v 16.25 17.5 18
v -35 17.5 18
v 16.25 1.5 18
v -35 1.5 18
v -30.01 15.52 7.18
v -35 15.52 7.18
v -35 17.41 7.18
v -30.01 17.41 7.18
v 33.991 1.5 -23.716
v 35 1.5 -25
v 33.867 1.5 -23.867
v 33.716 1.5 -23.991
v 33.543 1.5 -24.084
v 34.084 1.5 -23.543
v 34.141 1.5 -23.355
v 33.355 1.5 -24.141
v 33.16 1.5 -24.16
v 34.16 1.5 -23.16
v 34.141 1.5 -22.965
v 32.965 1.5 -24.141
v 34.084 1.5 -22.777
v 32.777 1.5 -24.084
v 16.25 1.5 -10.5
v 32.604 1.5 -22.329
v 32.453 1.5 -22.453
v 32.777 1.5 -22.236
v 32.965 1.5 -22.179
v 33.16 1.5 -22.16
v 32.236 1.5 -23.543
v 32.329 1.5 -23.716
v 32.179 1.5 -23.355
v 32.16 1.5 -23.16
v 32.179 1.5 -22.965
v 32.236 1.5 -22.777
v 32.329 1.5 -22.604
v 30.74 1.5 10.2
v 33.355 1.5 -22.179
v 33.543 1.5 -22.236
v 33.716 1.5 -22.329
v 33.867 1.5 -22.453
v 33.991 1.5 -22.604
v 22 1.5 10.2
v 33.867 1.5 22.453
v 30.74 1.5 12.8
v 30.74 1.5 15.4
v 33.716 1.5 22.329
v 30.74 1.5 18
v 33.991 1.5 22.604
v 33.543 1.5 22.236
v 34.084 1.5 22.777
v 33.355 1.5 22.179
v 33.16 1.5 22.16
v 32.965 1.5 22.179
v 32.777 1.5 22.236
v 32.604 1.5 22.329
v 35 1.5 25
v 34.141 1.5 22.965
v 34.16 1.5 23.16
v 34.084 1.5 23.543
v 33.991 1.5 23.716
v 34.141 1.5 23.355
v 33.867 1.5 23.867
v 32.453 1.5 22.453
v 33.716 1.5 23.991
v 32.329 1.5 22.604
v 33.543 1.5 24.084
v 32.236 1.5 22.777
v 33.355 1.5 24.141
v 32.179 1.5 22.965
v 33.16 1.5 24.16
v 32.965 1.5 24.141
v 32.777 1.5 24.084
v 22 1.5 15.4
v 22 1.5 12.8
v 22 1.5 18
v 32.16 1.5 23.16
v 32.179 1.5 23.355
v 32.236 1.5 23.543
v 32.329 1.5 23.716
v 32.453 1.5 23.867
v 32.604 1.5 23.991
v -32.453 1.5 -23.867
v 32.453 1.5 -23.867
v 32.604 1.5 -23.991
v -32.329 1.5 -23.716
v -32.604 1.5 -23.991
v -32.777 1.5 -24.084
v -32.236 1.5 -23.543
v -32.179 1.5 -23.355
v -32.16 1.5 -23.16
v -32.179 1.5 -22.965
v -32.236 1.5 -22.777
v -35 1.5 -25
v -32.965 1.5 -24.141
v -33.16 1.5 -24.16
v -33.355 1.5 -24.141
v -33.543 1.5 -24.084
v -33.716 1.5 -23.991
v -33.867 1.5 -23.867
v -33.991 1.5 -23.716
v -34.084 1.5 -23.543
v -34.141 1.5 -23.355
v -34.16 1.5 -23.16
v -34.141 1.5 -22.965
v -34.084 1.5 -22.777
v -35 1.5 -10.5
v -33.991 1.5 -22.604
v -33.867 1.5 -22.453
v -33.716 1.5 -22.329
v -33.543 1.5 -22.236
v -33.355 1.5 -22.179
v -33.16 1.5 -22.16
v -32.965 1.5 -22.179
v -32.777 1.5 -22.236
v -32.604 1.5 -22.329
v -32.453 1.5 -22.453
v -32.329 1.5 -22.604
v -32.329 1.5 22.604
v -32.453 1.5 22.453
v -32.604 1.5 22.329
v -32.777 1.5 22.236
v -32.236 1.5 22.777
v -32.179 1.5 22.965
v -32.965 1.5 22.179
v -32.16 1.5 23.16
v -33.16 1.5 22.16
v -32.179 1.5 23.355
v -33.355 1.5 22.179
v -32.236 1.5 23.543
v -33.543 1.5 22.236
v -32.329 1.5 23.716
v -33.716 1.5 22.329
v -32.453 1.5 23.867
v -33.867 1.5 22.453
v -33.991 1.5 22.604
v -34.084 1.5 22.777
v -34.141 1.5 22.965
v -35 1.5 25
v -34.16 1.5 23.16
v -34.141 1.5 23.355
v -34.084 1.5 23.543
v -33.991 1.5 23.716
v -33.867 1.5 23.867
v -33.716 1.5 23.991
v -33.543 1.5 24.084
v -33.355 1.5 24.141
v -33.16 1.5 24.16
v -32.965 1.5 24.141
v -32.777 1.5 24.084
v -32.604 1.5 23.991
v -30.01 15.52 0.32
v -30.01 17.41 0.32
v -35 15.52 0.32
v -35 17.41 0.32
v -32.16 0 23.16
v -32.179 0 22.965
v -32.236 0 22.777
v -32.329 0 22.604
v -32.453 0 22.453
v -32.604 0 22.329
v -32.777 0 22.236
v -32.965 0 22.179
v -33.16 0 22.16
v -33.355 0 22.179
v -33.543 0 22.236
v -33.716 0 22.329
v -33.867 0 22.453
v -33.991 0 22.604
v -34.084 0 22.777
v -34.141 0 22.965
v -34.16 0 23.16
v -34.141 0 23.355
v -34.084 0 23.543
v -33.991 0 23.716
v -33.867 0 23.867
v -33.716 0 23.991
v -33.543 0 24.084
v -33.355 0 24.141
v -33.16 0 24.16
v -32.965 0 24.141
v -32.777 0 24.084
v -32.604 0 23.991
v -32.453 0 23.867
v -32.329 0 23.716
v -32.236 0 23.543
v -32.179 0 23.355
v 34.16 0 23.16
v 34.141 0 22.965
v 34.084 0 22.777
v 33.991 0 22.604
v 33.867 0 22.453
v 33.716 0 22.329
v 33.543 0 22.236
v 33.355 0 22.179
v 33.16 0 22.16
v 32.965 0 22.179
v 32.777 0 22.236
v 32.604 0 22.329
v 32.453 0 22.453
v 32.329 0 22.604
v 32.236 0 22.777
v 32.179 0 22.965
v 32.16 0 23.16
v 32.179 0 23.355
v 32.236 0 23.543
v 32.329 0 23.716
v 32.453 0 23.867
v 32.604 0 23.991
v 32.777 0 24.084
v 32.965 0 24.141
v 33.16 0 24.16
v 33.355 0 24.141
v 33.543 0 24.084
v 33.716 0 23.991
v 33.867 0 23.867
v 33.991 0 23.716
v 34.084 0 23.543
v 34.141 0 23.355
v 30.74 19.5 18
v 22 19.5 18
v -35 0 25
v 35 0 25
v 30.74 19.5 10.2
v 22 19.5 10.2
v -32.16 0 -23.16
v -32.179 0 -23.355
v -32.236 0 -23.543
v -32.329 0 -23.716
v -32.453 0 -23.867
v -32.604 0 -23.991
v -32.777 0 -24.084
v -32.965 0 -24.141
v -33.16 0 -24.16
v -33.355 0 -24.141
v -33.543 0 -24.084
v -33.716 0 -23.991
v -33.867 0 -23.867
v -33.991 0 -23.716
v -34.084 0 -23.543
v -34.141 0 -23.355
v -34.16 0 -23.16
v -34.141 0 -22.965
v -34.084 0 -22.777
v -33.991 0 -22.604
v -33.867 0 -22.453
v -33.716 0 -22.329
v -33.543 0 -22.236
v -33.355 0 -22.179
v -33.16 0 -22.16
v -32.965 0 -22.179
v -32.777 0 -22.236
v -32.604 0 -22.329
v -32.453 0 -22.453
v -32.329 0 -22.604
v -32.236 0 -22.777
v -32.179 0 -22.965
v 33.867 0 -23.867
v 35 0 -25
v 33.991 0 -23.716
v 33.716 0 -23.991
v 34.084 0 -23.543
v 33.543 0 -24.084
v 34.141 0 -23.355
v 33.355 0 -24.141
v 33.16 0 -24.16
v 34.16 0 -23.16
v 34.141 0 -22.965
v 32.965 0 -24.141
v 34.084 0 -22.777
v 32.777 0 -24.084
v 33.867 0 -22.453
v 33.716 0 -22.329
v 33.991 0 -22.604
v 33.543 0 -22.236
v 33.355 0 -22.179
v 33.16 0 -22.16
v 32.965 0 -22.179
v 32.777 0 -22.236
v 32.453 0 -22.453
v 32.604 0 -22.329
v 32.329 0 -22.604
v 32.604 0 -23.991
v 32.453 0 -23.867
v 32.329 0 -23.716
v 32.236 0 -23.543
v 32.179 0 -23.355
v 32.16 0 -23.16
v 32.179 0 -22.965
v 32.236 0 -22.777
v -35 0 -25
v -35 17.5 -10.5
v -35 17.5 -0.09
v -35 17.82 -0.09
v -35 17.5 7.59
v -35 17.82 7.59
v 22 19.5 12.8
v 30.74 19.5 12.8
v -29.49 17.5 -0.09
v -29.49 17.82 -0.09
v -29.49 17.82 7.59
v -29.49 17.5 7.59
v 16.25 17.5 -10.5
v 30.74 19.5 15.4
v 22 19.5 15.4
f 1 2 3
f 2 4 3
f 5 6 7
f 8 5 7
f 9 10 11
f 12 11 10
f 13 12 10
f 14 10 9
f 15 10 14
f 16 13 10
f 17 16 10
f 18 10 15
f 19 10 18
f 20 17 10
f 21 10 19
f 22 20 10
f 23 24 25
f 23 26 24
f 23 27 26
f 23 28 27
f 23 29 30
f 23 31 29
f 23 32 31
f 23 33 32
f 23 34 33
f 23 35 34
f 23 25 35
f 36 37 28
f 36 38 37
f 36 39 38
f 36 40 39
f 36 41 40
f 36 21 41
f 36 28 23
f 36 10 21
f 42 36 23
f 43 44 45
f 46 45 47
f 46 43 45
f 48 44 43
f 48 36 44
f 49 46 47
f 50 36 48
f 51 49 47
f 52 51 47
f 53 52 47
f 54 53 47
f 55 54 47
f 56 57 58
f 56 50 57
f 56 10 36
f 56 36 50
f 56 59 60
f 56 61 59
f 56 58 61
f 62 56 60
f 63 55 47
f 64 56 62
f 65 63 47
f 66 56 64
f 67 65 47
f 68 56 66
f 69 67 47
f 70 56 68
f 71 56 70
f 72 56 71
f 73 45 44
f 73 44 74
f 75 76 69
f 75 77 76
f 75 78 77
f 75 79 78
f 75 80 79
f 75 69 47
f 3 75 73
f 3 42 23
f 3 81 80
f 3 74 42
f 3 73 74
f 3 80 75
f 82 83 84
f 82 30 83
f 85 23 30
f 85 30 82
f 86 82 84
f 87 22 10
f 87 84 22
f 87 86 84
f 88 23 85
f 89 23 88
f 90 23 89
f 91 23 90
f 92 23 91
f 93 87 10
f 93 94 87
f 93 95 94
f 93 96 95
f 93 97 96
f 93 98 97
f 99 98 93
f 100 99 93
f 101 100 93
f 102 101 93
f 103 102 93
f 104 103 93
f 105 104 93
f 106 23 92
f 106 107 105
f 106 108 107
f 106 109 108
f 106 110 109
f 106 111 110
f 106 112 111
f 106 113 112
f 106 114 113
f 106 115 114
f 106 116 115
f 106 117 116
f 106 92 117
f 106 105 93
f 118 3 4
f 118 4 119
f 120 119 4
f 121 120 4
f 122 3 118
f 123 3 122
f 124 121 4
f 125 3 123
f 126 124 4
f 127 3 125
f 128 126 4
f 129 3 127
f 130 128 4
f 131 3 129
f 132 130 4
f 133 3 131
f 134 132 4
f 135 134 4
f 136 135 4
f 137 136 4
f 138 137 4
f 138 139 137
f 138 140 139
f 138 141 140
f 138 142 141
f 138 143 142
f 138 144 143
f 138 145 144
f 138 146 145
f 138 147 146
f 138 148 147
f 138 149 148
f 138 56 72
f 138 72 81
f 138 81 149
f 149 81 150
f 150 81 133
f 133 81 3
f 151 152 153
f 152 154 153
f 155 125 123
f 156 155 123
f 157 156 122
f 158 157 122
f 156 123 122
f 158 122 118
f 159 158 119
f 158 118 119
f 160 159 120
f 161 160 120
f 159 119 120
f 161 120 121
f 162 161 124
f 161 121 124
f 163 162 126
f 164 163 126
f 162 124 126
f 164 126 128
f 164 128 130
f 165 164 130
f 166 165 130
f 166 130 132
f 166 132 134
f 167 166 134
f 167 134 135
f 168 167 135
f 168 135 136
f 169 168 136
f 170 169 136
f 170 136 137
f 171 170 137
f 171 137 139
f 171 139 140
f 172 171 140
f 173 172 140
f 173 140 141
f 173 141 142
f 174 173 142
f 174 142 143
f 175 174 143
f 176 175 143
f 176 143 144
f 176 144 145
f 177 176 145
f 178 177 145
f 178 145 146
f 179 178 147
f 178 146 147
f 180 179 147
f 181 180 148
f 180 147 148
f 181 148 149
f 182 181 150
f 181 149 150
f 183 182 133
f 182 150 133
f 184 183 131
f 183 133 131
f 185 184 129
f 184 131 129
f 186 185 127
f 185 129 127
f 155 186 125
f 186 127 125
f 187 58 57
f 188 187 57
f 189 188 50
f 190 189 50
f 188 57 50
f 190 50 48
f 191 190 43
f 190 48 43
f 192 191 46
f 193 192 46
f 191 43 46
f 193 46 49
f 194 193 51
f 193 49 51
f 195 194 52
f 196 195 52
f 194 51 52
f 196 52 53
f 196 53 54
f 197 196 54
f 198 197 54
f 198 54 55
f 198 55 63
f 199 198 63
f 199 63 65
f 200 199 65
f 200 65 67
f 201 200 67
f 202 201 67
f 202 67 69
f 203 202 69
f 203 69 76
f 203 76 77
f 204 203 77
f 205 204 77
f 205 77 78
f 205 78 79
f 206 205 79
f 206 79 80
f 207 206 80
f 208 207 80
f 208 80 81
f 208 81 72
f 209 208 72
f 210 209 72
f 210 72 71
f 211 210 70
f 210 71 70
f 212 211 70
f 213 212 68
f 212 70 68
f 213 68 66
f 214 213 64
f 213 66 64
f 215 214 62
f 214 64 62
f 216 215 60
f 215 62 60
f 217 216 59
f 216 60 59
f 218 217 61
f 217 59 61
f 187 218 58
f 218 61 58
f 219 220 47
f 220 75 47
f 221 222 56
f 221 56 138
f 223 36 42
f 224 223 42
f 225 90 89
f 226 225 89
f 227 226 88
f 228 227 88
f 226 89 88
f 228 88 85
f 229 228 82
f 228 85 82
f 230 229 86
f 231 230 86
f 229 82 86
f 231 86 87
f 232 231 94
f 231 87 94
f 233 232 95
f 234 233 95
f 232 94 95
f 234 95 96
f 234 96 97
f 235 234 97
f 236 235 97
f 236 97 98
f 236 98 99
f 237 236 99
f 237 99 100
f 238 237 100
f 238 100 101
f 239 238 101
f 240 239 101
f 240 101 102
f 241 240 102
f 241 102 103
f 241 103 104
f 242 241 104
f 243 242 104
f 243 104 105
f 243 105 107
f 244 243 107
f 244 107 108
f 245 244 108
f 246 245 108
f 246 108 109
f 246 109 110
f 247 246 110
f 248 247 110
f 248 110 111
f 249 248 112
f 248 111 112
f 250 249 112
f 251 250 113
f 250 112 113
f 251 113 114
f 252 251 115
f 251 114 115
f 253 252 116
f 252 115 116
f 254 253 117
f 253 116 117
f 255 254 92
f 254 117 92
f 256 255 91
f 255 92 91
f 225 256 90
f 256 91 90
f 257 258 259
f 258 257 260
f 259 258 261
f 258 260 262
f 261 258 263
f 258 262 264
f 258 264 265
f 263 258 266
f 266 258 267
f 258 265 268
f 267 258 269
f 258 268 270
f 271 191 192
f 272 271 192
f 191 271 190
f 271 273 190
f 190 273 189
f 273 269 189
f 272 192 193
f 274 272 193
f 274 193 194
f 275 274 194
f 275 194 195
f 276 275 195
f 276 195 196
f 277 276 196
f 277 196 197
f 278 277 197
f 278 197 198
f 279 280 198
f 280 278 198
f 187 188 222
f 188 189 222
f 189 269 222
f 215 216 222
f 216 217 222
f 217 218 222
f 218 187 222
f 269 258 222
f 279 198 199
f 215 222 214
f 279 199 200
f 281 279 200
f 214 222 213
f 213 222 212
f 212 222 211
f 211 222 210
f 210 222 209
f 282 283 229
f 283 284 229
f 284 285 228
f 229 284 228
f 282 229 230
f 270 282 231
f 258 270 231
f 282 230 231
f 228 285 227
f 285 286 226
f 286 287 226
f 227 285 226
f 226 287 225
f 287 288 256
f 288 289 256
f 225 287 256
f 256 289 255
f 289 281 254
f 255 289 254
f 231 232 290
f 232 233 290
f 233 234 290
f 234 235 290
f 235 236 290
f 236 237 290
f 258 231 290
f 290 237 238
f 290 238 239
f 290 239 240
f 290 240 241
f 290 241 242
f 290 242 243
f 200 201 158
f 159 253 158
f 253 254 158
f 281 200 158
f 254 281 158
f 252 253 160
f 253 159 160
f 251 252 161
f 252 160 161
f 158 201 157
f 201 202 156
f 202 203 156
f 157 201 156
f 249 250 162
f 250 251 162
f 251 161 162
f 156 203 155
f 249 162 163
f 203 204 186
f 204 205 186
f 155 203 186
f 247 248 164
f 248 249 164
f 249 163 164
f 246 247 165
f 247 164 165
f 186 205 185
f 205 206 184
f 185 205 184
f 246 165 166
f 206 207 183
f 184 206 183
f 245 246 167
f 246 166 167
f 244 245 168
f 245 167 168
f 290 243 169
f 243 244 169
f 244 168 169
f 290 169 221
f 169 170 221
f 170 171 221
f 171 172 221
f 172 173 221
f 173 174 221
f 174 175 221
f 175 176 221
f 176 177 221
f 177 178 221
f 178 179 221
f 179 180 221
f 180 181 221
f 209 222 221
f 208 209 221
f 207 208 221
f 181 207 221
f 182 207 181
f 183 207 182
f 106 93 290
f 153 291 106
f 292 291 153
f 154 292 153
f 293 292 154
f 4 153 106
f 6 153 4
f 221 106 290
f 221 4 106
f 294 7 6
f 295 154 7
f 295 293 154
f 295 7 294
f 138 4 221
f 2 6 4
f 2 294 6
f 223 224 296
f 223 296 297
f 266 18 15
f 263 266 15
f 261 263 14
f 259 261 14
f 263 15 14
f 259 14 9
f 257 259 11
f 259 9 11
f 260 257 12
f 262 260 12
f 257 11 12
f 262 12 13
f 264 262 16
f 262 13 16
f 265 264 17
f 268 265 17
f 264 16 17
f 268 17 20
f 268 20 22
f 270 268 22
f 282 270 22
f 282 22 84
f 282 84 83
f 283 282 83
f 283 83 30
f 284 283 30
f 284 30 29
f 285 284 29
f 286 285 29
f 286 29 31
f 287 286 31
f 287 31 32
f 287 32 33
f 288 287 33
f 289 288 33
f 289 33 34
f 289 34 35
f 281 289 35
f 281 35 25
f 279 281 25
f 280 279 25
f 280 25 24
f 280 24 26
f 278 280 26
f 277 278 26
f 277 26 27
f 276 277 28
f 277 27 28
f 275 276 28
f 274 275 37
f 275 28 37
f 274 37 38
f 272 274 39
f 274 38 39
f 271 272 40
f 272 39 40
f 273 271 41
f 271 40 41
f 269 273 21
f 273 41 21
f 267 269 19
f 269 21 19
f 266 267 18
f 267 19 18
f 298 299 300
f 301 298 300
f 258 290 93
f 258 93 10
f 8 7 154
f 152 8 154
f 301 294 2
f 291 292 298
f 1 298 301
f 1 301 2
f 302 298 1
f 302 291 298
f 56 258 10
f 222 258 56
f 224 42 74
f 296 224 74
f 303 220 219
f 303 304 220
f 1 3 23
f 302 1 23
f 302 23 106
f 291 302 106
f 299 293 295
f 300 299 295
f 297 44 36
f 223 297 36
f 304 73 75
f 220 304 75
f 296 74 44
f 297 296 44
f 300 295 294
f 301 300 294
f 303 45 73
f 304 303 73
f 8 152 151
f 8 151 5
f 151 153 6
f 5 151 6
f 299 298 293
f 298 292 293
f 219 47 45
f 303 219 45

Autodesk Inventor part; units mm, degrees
ref_plane "YZ Plane" through (0, 0, 0) normal (1, 0, 0) x (0, 1, 0)
ref_plane "XZ Plane" through (0, 0, 0) normal (0, 1, 0) x (-1, 0, 0)
ref_plane "XY Plane" through (0, 0, 0) normal (0, 0, 1) x (1, 0, 0)
sketch "Sketch1" plane through (0, 0, 0) normal (0, 1, 0) x (-1, 0, 0)
  line L0 (-35, 25) -> (35, 25)
  line L1 (35, 25) -> (35, -25)
  line L2 (35, -25) -> (-35, -25)
  line L3 (-35, -25) -> (-35, 25)
  line L4 (-35, 25) -> (35, -25) construction
  line L5 (35, 25) -> (-35, -25) construction
  point P0 (0, 0)
  dimension "d0" = 70
  dimension "d1" = 50
extrude "Extrusion1" add sketch "Sketch1" along normal blind 1.5
sketch "Sketch4" plane through (0, 1.5, 0) normal (0, 1, 0) x (1, 0, 0)
  line L0 (16.25, 10.5) -> (-35, 10.5)
  line L1 (-35, 10.5) -> (-35, -18)
  line L2 (-35, -18) -> (16.25, -18)
  line L3 (16.25, -18) -> (16.25, 10.5)
  line L4 (16.25, 10.5) -> (-35, -18) construction
  line L5 (-35, 10.5) -> (16.25, -18) construction
  line L6 (-35, -25) -> (35, -25) projected
  line L7 (-35, 25) -> (-35, -25) projected
  dimension "d10" = 51.25
  dimension "d11" = 28.5
  dimension "d12" = 7
extrude "Extrusion3" add sketch "Sketch4" along normal blind 16
sketch "Sketch5" plane through (0, 1.5, 0) normal (0, 1, 0) x (1, 0, 0)
  line L0 (30.74, -15.4) -> (22, -15.4)
  line L1 (22, -15.4) -> (22, -18)
  line L2 (22, -18) -> (30.74, -18)
  line L3 (30.74, -18) -> (30.74, -15.4)
  line L4 (30.74, -15.4) -> (22, -18) construction
  line L5 (22, -15.4) -> (30.74, -18) construction
  line L6 (16.25, -18) -> (16.25, 10.5) projected
  line L7 (-35, -18) -> (16.25, -18) projected
  line L8 (30.74, -10.2) -> (22, -10.2)
  line L9 (22, -10.2) -> (22, -12.8)
  line L10 (22, -12.8) -> (30.74, -12.8)
  line L11 (30.74, -12.8) -> (30.74, -10.2)
  line L12 (30.74, -10.2) -> (22, -12.8) construction
  line L13 (22, -10.2) -> (30.74, -12.8) construction
  point P0 (0, 0)
  point P1 (26.37, -16.7)
  point P2 (22, -16.7)
  point P3 (26.37, -11.5)
  point P4 (22, -11.5)
  dimension "d15" = 5.75
  dimension "d16" = 8.74
  dimension "d17" = 2.6
  dimension "d18" = 8.74
  dimension "d19" = 2.6
  dimension "d20" = 2.6
extrude "Extrusion4" add sketch "Sketch5" along normal blind 18
sketch "Sketch6" plane through (-35, 0, -25) normal (-1, 0, 0) x (0, 0, 1)
  line L0 (24.91, 17.82) -> (32.59, 17.82)
  line L1 (32.59, 17.82) -> (32.59, 15.11)
  line L2 (32.59, 15.11) -> (24.91, 15.11)
  line L3 (24.91, 15.11) -> (24.91, 17.82)
  line L4 (24.91, 17.82) -> (32.59, 15.11) construction
  line L5 (32.59, 17.82) -> (24.91, 15.11) construction
  line L6 (43, 1.5) -> (50, 1.5) projected
  line L7 (43, 1.5) -> (43, 17.5) projected
  line L8 (14.5, 1.5) -> (14.5, 17.5) projected
  line L9 (32.18, 17.41) -> (25.32, 17.41)
  line L10 (25.32, 17.41) -> (25.32, 15.52)
  line L11 (25.32, 15.52) -> (32.18, 15.52)
  line L12 (32.18, 15.52) -> (32.18, 17.41)
  point P0 (25, 0)
  point P1 (28.75, 16.465)
  dimension "d23" = 16.32
  dimension "d24" = 2.71
  dimension "d25" = 7.68
  dimension "d26" = 14.25
  dimension "d27" = 14.25
  dimension "d28" = 0.41
extrude "Extrusion5" add sketch "Sketch6" against normal blind 5.51
sketch "Sketch7" plane through (-35, 0, -25) normal (-1, 0, 0) x (0, 0, 1)
  line L0 (32.18, 17.41) -> (25.32, 17.41) projected
  line L1 (25.32, 17.41) -> (25.32, 15.52) projected
  line L2 (25.32, 15.52) -> (32.18, 15.52) projected
  line L3 (32.18, 15.52) -> (32.18, 17.41) projected
  point P0 (25, 0)
extrude "Extrusion6" cut sketch "Sketch7" against normal blind 4.99
sketch "Sketch8" plane through (0, 1.5, 0) normal (0, 1, 0) x (1, 0, 0)
  circle A0 centre (33.16, -23.16) radius 1
  circle A1 centre (-33.16, -23.16) radius 1
  circle A2 centre (-33.16, 23.16) radius 1
  circle A3 centre (33.16, 23.16) radius 1
  line L0 (22, -10.2) -> (30.74, -10.2) projected
  line L1 (30.74, -10.2) -> (30.74, -12.8) projected
  line L2 (30.74, -12.8) -> (22, -12.8) projected
  line L3 (22, -12.8) -> (22, -10.2) projected
  line L4 (22, -15.4) -> (30.74, -15.4) projected
  line L5 (30.74, -15.4) -> (30.74, -18) projected
  line L6 (30.74, -18) -> (22, -18) projected
  line L7 (22, -18) -> (22, -15.4) projected
  line L8 (16.25, -18) -> (-35, -18) projected
  line L9 (-35, -18) -> (-35, -25) projected
  line L10 (-35, -25) -> (35, -25) projected
  line L11 (35, -25) -> (35, 25) projected
  line L12 (35, 25) -> (-35, 25) projected
  line L13 (-35, 25) -> (-35, 10.5) projected
  line L14 (-35, 10.5) -> (16.25, 10.5) projected
  line L15 (16.25, 10.5) -> (16.25, -18) projected
  point P0 (0, 0)
  dimension "d33" = 2
  dimension "d34" = 2
  dimension "d35" = 2
  dimension "d36" = 2
  dimension "d37" = 1.84
  dimension "d38" = 1.84
  dimension "d39" = 1.84
  dimension "d40" = 1.84
  dimension "d41" = 1.84
  dimension "d42" = 1.84
  dimension "d43" = 1.84
  dimension "d44" = 1.84
extrude "Extrusion7" cut sketch "Sketch8" against normal blind 10 contours A0 | A1 | A2 | A3
equation "\"d26\" = d27"
equation "\"d38\" = d37"
equation "\"d39\" = d37"
equation "\"d40\" = d37"
equation "\"d41\" = d37"
equation "\"d42\" = d37"
equation "\"d43\" = d37"
equation "\"d44\" = d37"
properties part number "PCBModel"
